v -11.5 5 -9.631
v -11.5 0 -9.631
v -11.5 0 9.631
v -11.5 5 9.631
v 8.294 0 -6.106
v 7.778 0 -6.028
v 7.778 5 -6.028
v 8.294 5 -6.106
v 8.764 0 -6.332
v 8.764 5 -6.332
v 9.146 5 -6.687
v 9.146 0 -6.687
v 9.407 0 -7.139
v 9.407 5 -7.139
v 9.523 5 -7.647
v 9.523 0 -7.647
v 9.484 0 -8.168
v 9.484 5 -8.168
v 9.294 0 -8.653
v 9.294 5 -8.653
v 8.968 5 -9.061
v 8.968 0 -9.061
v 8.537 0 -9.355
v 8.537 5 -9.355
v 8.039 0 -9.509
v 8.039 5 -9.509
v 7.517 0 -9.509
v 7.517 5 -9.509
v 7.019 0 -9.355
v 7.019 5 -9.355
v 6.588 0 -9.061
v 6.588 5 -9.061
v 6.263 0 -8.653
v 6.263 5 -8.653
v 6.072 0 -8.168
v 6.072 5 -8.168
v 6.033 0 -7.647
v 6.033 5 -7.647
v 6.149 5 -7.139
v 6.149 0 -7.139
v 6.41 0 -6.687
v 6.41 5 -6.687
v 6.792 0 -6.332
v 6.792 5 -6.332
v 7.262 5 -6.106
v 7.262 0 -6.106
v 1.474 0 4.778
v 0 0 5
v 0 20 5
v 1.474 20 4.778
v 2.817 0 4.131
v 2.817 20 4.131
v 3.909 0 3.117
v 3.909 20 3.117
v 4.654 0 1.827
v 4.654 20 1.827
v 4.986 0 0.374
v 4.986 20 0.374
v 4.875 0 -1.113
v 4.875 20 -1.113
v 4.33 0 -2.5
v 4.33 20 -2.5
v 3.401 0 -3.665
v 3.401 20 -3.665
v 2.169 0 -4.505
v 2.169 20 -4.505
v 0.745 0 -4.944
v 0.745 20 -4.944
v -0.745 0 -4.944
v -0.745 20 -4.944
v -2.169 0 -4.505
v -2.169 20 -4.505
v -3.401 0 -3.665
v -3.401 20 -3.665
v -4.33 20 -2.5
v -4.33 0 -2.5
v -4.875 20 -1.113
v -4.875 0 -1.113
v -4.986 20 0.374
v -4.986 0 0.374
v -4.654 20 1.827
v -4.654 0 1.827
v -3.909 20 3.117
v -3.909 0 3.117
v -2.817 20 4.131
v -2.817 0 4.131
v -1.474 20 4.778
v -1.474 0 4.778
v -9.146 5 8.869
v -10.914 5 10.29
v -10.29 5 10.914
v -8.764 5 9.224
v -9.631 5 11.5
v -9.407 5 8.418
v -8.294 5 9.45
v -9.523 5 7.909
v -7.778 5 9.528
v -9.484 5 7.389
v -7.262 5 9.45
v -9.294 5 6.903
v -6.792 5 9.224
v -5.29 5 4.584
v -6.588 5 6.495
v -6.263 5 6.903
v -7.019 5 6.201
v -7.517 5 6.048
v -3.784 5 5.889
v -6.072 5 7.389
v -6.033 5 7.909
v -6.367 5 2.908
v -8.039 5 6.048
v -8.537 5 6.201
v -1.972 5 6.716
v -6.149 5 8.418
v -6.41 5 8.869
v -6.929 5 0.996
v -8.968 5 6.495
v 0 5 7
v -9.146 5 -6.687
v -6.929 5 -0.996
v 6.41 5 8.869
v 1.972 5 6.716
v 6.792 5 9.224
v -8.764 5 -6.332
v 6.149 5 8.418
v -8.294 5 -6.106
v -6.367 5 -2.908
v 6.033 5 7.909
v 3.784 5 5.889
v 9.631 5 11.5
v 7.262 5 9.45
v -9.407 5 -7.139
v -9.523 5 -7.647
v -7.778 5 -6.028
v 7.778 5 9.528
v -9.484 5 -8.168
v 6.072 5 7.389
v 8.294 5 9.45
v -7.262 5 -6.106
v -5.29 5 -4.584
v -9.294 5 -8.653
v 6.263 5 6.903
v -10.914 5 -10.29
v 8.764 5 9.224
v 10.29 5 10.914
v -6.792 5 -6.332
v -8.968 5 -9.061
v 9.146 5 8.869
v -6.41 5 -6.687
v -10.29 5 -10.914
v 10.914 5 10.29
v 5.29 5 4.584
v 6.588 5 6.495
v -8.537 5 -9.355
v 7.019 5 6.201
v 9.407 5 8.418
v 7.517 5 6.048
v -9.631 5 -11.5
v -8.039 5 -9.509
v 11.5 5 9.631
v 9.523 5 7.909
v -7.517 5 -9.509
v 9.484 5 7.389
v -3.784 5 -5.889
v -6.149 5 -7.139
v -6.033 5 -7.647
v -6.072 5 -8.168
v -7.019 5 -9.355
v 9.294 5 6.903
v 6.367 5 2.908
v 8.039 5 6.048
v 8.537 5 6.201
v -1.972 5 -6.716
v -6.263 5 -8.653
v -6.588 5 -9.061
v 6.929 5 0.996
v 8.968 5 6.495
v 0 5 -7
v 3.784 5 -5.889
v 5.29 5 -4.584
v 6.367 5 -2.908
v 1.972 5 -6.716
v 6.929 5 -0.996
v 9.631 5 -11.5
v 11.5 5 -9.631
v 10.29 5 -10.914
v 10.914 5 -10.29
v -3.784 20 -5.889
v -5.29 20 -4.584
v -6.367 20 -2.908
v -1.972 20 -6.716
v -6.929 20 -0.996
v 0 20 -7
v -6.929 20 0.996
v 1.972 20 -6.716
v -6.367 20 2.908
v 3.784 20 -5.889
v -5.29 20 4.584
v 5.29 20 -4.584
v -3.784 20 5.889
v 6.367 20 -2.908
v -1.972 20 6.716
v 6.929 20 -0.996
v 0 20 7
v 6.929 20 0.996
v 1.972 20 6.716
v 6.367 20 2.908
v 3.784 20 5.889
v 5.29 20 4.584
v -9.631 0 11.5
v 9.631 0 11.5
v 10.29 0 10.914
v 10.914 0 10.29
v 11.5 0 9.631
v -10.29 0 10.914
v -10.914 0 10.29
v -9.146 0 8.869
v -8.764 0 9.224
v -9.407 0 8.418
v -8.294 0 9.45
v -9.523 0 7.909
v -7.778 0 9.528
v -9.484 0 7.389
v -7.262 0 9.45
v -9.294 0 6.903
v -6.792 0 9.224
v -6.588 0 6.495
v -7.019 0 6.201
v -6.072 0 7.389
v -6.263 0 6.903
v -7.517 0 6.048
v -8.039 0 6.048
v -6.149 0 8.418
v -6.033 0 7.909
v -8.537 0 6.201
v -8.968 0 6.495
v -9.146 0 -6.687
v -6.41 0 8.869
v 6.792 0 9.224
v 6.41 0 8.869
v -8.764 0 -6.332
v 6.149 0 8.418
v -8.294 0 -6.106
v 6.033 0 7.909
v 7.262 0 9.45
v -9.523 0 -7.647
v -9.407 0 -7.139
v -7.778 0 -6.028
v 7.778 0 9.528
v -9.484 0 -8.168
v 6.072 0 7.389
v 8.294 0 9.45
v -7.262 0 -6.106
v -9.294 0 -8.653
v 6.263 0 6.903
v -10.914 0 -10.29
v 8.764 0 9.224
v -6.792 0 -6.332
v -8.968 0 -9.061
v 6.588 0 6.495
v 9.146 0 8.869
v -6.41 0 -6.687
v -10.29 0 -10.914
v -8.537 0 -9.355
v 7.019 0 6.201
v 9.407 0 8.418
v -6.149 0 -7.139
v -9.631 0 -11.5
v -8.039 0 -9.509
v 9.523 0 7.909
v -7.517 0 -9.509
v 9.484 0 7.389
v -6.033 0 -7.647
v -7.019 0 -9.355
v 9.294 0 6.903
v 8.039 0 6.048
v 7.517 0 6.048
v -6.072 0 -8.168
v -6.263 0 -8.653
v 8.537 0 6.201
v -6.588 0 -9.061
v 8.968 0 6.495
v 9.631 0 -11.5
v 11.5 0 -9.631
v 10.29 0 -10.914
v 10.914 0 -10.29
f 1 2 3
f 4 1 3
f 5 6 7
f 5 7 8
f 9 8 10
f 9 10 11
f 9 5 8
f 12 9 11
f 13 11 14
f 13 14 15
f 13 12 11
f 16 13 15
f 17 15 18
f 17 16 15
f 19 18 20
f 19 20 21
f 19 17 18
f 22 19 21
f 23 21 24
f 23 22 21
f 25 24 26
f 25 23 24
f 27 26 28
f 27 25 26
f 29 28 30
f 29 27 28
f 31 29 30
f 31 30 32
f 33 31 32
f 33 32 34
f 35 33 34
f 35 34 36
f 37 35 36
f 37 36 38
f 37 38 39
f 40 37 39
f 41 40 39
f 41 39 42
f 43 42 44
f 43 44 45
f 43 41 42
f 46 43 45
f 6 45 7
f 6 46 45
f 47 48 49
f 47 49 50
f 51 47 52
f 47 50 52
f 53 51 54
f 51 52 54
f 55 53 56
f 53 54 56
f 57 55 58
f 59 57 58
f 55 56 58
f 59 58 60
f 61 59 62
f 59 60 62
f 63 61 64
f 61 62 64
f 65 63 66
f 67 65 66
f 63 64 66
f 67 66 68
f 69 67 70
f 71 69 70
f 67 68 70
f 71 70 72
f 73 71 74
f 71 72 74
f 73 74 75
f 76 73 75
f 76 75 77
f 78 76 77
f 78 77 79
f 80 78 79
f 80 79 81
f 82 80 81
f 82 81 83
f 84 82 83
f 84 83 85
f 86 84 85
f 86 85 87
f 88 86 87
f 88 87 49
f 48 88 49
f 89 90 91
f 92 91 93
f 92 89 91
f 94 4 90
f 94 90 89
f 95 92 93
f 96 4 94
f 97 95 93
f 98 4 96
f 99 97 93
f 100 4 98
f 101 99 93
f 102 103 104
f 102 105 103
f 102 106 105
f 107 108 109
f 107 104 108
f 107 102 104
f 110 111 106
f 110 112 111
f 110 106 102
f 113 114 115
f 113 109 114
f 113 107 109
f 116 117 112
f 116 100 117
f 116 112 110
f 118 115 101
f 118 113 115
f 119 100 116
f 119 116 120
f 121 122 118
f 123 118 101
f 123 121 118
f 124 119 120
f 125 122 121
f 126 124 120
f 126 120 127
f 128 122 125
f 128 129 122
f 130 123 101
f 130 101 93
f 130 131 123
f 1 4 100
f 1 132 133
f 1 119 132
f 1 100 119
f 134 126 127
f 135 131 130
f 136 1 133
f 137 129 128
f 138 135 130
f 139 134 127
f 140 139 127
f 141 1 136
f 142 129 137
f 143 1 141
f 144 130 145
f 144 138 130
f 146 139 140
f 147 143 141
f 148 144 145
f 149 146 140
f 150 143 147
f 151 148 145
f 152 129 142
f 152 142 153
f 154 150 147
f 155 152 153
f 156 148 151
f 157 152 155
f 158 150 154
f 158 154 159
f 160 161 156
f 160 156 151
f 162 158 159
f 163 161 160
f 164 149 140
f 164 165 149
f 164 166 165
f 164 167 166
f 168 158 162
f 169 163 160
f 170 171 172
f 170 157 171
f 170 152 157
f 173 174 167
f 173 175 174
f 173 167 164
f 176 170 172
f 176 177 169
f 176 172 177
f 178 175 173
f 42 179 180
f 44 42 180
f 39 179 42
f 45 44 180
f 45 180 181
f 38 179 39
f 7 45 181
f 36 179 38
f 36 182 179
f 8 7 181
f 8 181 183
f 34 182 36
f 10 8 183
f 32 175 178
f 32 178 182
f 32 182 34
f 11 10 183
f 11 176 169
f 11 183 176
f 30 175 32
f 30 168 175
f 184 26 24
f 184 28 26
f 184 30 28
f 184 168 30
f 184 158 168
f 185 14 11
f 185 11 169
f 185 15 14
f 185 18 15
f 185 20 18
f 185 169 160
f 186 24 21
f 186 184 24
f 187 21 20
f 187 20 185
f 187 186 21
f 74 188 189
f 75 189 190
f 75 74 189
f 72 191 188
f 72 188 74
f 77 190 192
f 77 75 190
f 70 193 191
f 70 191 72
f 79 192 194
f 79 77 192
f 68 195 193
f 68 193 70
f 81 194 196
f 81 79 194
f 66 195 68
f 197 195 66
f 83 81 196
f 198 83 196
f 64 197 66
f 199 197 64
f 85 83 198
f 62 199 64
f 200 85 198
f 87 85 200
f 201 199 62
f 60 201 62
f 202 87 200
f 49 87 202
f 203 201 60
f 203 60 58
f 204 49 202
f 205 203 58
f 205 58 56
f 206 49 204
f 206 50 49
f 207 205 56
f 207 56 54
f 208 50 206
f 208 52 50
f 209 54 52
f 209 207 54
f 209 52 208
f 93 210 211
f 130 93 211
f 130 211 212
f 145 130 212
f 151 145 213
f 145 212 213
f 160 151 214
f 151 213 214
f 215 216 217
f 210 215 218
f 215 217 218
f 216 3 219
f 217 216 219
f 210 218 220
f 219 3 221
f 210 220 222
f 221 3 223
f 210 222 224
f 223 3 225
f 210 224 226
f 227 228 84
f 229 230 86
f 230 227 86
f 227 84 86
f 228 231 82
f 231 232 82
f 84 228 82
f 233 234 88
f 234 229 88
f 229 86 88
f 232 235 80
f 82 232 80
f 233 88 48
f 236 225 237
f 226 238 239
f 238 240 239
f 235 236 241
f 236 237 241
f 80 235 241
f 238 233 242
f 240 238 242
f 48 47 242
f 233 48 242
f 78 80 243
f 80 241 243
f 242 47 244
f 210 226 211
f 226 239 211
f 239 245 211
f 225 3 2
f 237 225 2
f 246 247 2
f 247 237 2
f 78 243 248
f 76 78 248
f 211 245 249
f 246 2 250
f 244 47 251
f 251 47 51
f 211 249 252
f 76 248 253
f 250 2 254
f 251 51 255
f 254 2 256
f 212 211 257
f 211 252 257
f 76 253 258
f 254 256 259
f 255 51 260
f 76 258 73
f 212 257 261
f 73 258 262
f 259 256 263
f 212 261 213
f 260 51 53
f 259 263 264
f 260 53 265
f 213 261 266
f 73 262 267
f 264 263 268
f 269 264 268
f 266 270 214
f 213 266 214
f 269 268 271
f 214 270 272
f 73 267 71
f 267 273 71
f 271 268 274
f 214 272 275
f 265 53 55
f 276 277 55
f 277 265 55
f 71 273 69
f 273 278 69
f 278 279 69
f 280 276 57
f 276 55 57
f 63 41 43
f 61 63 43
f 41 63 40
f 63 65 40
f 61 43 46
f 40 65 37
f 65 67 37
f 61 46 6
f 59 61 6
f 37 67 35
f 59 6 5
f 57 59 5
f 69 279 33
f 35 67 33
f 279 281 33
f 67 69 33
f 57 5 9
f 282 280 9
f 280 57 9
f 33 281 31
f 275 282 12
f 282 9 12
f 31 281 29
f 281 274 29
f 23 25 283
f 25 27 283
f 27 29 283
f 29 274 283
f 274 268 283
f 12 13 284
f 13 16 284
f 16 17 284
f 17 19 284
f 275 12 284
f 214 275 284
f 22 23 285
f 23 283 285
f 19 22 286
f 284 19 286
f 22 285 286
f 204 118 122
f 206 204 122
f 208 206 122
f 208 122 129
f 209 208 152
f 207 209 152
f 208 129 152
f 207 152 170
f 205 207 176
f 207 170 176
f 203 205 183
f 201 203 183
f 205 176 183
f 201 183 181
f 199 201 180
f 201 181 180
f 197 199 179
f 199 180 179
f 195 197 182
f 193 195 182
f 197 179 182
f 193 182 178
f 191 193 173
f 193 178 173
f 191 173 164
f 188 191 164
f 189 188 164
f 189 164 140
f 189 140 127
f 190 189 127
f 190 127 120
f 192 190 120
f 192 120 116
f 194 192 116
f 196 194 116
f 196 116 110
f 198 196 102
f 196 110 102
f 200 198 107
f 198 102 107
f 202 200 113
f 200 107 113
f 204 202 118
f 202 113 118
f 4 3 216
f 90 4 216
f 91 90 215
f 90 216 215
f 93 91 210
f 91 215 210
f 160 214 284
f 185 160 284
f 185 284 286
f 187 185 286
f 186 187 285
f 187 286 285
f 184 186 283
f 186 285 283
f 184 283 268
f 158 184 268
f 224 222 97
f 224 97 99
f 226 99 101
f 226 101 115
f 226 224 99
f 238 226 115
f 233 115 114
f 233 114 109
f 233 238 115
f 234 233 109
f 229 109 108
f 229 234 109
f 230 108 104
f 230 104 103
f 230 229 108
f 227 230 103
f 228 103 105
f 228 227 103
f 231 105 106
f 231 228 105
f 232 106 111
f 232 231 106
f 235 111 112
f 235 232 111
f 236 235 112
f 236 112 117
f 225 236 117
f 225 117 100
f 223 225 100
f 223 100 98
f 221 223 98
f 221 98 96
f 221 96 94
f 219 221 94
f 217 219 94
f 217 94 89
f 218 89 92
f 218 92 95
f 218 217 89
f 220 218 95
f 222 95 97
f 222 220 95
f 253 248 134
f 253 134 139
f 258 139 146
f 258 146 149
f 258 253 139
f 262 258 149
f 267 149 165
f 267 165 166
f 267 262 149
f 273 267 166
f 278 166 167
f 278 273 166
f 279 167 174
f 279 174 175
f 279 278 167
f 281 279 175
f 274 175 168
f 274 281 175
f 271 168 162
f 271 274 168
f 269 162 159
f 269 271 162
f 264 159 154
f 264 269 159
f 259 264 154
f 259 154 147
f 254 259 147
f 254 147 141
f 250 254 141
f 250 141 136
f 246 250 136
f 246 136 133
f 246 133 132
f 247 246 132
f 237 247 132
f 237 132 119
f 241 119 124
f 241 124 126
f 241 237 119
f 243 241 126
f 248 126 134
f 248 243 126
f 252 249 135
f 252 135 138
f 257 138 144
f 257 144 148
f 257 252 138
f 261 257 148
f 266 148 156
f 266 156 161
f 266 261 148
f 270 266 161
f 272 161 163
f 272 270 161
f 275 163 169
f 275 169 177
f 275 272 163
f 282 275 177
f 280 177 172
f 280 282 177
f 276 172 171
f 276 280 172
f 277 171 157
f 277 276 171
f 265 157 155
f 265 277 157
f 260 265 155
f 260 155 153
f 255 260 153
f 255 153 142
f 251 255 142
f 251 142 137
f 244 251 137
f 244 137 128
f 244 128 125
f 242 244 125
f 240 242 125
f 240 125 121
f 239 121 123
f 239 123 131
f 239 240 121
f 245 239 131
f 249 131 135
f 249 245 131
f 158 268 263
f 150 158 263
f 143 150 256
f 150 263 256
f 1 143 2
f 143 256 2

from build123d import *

# Parameters (mm, degrees)
SKETCH1_R           = 1.75
BOSS_EXTRUDE1_DEPTH = 5
SKETCH2_R           = 7
BOSS_EXTRUDE2_DEPTH = 15
SKETCH3_R           = 5
CUT_EXTRUDE1_DEPTH  = 26.777897509


with BuildPart() as part:
    # Sketch1 → Boss-Extrude1 (new body)
    with BuildSketch(Plane(origin=(0, 0, 0), x_dir=(1, 0, 0), z_dir=(0, 1, 0))):
        with BuildLine():
            Line((-9.630680142, -11.5), (9.630680142, -11.5))
            ThreePointArc((9.630680142, -11.5), (10.606601718, -10.606601718), (11.5, -9.630680142))
            Line((11.5, -9.630680142), (11.5, 9.630680142))
            ThreePointArc((11.5, 9.630680142), (10.606601718, 10.606601718), (9.630680142, 11.5))
            Line((9.630680142, 11.5), (-9.630680142, 11.5))
            ThreePointArc((-9.630680142, 11.5), (-10.606601718, 10.606601718), (-11.5, 9.630680142))
            Line((-11.5, 9.630680142), (-11.5, -9.630680142))
            ThreePointArc((-11.5, -9.630680142), (-10.606601718, -10.606601718), (-9.630680142, -11.5))
        make_face()
        with Locations(Location((-7.778174593, 7.778174593, 0), (0, 0, 270))):
            Circle(SKETCH1_R, mode=Mode.SUBTRACT)
        with Locations(Location((7.778174593, 7.778174593, 0), (0, 0, 270))):
            Circle(SKETCH1_R, mode=Mode.SUBTRACT)
        with Locations(Location((-7.778174593, -7.778174593, 0), (0, 0, 270))):
            Circle(SKETCH1_R, mode=Mode.SUBTRACT)
        with Locations(Location((7.778174593, -7.778174593, 0), (0, 0, 270))):
            Circle(SKETCH1_R, mode=Mode.SUBTRACT)
    extrude(amount=BOSS_EXTRUDE1_DEPTH)

    # Sketch2 → Boss-Extrude2 (add)
    with BuildSketch(Plane(origin=(0, 5, 0), x_dir=(1, 0, 0), z_dir=(0, 1, 0))):
        with Locations(Location((0, 0, 0), (0, 0, 270))):
            Circle(SKETCH2_R)
    extrude(amount=BOSS_EXTRUDE2_DEPTH)

    # Sketch3 → Cut-Extrude1 (cut, through all)
    with BuildSketch(Plane(origin=(0, 20, 0), x_dir=(1, 0, 0), z_dir=(0, 1, 0))):
        with Locations(Location((0, 0, 0), (0, 0, 270))):
            Circle(SKETCH3_R)
    extrude(amount=-CUT_EXTRUDE1_DEPTH, mode=Mode.SUBTRACT)


solid = part.part
